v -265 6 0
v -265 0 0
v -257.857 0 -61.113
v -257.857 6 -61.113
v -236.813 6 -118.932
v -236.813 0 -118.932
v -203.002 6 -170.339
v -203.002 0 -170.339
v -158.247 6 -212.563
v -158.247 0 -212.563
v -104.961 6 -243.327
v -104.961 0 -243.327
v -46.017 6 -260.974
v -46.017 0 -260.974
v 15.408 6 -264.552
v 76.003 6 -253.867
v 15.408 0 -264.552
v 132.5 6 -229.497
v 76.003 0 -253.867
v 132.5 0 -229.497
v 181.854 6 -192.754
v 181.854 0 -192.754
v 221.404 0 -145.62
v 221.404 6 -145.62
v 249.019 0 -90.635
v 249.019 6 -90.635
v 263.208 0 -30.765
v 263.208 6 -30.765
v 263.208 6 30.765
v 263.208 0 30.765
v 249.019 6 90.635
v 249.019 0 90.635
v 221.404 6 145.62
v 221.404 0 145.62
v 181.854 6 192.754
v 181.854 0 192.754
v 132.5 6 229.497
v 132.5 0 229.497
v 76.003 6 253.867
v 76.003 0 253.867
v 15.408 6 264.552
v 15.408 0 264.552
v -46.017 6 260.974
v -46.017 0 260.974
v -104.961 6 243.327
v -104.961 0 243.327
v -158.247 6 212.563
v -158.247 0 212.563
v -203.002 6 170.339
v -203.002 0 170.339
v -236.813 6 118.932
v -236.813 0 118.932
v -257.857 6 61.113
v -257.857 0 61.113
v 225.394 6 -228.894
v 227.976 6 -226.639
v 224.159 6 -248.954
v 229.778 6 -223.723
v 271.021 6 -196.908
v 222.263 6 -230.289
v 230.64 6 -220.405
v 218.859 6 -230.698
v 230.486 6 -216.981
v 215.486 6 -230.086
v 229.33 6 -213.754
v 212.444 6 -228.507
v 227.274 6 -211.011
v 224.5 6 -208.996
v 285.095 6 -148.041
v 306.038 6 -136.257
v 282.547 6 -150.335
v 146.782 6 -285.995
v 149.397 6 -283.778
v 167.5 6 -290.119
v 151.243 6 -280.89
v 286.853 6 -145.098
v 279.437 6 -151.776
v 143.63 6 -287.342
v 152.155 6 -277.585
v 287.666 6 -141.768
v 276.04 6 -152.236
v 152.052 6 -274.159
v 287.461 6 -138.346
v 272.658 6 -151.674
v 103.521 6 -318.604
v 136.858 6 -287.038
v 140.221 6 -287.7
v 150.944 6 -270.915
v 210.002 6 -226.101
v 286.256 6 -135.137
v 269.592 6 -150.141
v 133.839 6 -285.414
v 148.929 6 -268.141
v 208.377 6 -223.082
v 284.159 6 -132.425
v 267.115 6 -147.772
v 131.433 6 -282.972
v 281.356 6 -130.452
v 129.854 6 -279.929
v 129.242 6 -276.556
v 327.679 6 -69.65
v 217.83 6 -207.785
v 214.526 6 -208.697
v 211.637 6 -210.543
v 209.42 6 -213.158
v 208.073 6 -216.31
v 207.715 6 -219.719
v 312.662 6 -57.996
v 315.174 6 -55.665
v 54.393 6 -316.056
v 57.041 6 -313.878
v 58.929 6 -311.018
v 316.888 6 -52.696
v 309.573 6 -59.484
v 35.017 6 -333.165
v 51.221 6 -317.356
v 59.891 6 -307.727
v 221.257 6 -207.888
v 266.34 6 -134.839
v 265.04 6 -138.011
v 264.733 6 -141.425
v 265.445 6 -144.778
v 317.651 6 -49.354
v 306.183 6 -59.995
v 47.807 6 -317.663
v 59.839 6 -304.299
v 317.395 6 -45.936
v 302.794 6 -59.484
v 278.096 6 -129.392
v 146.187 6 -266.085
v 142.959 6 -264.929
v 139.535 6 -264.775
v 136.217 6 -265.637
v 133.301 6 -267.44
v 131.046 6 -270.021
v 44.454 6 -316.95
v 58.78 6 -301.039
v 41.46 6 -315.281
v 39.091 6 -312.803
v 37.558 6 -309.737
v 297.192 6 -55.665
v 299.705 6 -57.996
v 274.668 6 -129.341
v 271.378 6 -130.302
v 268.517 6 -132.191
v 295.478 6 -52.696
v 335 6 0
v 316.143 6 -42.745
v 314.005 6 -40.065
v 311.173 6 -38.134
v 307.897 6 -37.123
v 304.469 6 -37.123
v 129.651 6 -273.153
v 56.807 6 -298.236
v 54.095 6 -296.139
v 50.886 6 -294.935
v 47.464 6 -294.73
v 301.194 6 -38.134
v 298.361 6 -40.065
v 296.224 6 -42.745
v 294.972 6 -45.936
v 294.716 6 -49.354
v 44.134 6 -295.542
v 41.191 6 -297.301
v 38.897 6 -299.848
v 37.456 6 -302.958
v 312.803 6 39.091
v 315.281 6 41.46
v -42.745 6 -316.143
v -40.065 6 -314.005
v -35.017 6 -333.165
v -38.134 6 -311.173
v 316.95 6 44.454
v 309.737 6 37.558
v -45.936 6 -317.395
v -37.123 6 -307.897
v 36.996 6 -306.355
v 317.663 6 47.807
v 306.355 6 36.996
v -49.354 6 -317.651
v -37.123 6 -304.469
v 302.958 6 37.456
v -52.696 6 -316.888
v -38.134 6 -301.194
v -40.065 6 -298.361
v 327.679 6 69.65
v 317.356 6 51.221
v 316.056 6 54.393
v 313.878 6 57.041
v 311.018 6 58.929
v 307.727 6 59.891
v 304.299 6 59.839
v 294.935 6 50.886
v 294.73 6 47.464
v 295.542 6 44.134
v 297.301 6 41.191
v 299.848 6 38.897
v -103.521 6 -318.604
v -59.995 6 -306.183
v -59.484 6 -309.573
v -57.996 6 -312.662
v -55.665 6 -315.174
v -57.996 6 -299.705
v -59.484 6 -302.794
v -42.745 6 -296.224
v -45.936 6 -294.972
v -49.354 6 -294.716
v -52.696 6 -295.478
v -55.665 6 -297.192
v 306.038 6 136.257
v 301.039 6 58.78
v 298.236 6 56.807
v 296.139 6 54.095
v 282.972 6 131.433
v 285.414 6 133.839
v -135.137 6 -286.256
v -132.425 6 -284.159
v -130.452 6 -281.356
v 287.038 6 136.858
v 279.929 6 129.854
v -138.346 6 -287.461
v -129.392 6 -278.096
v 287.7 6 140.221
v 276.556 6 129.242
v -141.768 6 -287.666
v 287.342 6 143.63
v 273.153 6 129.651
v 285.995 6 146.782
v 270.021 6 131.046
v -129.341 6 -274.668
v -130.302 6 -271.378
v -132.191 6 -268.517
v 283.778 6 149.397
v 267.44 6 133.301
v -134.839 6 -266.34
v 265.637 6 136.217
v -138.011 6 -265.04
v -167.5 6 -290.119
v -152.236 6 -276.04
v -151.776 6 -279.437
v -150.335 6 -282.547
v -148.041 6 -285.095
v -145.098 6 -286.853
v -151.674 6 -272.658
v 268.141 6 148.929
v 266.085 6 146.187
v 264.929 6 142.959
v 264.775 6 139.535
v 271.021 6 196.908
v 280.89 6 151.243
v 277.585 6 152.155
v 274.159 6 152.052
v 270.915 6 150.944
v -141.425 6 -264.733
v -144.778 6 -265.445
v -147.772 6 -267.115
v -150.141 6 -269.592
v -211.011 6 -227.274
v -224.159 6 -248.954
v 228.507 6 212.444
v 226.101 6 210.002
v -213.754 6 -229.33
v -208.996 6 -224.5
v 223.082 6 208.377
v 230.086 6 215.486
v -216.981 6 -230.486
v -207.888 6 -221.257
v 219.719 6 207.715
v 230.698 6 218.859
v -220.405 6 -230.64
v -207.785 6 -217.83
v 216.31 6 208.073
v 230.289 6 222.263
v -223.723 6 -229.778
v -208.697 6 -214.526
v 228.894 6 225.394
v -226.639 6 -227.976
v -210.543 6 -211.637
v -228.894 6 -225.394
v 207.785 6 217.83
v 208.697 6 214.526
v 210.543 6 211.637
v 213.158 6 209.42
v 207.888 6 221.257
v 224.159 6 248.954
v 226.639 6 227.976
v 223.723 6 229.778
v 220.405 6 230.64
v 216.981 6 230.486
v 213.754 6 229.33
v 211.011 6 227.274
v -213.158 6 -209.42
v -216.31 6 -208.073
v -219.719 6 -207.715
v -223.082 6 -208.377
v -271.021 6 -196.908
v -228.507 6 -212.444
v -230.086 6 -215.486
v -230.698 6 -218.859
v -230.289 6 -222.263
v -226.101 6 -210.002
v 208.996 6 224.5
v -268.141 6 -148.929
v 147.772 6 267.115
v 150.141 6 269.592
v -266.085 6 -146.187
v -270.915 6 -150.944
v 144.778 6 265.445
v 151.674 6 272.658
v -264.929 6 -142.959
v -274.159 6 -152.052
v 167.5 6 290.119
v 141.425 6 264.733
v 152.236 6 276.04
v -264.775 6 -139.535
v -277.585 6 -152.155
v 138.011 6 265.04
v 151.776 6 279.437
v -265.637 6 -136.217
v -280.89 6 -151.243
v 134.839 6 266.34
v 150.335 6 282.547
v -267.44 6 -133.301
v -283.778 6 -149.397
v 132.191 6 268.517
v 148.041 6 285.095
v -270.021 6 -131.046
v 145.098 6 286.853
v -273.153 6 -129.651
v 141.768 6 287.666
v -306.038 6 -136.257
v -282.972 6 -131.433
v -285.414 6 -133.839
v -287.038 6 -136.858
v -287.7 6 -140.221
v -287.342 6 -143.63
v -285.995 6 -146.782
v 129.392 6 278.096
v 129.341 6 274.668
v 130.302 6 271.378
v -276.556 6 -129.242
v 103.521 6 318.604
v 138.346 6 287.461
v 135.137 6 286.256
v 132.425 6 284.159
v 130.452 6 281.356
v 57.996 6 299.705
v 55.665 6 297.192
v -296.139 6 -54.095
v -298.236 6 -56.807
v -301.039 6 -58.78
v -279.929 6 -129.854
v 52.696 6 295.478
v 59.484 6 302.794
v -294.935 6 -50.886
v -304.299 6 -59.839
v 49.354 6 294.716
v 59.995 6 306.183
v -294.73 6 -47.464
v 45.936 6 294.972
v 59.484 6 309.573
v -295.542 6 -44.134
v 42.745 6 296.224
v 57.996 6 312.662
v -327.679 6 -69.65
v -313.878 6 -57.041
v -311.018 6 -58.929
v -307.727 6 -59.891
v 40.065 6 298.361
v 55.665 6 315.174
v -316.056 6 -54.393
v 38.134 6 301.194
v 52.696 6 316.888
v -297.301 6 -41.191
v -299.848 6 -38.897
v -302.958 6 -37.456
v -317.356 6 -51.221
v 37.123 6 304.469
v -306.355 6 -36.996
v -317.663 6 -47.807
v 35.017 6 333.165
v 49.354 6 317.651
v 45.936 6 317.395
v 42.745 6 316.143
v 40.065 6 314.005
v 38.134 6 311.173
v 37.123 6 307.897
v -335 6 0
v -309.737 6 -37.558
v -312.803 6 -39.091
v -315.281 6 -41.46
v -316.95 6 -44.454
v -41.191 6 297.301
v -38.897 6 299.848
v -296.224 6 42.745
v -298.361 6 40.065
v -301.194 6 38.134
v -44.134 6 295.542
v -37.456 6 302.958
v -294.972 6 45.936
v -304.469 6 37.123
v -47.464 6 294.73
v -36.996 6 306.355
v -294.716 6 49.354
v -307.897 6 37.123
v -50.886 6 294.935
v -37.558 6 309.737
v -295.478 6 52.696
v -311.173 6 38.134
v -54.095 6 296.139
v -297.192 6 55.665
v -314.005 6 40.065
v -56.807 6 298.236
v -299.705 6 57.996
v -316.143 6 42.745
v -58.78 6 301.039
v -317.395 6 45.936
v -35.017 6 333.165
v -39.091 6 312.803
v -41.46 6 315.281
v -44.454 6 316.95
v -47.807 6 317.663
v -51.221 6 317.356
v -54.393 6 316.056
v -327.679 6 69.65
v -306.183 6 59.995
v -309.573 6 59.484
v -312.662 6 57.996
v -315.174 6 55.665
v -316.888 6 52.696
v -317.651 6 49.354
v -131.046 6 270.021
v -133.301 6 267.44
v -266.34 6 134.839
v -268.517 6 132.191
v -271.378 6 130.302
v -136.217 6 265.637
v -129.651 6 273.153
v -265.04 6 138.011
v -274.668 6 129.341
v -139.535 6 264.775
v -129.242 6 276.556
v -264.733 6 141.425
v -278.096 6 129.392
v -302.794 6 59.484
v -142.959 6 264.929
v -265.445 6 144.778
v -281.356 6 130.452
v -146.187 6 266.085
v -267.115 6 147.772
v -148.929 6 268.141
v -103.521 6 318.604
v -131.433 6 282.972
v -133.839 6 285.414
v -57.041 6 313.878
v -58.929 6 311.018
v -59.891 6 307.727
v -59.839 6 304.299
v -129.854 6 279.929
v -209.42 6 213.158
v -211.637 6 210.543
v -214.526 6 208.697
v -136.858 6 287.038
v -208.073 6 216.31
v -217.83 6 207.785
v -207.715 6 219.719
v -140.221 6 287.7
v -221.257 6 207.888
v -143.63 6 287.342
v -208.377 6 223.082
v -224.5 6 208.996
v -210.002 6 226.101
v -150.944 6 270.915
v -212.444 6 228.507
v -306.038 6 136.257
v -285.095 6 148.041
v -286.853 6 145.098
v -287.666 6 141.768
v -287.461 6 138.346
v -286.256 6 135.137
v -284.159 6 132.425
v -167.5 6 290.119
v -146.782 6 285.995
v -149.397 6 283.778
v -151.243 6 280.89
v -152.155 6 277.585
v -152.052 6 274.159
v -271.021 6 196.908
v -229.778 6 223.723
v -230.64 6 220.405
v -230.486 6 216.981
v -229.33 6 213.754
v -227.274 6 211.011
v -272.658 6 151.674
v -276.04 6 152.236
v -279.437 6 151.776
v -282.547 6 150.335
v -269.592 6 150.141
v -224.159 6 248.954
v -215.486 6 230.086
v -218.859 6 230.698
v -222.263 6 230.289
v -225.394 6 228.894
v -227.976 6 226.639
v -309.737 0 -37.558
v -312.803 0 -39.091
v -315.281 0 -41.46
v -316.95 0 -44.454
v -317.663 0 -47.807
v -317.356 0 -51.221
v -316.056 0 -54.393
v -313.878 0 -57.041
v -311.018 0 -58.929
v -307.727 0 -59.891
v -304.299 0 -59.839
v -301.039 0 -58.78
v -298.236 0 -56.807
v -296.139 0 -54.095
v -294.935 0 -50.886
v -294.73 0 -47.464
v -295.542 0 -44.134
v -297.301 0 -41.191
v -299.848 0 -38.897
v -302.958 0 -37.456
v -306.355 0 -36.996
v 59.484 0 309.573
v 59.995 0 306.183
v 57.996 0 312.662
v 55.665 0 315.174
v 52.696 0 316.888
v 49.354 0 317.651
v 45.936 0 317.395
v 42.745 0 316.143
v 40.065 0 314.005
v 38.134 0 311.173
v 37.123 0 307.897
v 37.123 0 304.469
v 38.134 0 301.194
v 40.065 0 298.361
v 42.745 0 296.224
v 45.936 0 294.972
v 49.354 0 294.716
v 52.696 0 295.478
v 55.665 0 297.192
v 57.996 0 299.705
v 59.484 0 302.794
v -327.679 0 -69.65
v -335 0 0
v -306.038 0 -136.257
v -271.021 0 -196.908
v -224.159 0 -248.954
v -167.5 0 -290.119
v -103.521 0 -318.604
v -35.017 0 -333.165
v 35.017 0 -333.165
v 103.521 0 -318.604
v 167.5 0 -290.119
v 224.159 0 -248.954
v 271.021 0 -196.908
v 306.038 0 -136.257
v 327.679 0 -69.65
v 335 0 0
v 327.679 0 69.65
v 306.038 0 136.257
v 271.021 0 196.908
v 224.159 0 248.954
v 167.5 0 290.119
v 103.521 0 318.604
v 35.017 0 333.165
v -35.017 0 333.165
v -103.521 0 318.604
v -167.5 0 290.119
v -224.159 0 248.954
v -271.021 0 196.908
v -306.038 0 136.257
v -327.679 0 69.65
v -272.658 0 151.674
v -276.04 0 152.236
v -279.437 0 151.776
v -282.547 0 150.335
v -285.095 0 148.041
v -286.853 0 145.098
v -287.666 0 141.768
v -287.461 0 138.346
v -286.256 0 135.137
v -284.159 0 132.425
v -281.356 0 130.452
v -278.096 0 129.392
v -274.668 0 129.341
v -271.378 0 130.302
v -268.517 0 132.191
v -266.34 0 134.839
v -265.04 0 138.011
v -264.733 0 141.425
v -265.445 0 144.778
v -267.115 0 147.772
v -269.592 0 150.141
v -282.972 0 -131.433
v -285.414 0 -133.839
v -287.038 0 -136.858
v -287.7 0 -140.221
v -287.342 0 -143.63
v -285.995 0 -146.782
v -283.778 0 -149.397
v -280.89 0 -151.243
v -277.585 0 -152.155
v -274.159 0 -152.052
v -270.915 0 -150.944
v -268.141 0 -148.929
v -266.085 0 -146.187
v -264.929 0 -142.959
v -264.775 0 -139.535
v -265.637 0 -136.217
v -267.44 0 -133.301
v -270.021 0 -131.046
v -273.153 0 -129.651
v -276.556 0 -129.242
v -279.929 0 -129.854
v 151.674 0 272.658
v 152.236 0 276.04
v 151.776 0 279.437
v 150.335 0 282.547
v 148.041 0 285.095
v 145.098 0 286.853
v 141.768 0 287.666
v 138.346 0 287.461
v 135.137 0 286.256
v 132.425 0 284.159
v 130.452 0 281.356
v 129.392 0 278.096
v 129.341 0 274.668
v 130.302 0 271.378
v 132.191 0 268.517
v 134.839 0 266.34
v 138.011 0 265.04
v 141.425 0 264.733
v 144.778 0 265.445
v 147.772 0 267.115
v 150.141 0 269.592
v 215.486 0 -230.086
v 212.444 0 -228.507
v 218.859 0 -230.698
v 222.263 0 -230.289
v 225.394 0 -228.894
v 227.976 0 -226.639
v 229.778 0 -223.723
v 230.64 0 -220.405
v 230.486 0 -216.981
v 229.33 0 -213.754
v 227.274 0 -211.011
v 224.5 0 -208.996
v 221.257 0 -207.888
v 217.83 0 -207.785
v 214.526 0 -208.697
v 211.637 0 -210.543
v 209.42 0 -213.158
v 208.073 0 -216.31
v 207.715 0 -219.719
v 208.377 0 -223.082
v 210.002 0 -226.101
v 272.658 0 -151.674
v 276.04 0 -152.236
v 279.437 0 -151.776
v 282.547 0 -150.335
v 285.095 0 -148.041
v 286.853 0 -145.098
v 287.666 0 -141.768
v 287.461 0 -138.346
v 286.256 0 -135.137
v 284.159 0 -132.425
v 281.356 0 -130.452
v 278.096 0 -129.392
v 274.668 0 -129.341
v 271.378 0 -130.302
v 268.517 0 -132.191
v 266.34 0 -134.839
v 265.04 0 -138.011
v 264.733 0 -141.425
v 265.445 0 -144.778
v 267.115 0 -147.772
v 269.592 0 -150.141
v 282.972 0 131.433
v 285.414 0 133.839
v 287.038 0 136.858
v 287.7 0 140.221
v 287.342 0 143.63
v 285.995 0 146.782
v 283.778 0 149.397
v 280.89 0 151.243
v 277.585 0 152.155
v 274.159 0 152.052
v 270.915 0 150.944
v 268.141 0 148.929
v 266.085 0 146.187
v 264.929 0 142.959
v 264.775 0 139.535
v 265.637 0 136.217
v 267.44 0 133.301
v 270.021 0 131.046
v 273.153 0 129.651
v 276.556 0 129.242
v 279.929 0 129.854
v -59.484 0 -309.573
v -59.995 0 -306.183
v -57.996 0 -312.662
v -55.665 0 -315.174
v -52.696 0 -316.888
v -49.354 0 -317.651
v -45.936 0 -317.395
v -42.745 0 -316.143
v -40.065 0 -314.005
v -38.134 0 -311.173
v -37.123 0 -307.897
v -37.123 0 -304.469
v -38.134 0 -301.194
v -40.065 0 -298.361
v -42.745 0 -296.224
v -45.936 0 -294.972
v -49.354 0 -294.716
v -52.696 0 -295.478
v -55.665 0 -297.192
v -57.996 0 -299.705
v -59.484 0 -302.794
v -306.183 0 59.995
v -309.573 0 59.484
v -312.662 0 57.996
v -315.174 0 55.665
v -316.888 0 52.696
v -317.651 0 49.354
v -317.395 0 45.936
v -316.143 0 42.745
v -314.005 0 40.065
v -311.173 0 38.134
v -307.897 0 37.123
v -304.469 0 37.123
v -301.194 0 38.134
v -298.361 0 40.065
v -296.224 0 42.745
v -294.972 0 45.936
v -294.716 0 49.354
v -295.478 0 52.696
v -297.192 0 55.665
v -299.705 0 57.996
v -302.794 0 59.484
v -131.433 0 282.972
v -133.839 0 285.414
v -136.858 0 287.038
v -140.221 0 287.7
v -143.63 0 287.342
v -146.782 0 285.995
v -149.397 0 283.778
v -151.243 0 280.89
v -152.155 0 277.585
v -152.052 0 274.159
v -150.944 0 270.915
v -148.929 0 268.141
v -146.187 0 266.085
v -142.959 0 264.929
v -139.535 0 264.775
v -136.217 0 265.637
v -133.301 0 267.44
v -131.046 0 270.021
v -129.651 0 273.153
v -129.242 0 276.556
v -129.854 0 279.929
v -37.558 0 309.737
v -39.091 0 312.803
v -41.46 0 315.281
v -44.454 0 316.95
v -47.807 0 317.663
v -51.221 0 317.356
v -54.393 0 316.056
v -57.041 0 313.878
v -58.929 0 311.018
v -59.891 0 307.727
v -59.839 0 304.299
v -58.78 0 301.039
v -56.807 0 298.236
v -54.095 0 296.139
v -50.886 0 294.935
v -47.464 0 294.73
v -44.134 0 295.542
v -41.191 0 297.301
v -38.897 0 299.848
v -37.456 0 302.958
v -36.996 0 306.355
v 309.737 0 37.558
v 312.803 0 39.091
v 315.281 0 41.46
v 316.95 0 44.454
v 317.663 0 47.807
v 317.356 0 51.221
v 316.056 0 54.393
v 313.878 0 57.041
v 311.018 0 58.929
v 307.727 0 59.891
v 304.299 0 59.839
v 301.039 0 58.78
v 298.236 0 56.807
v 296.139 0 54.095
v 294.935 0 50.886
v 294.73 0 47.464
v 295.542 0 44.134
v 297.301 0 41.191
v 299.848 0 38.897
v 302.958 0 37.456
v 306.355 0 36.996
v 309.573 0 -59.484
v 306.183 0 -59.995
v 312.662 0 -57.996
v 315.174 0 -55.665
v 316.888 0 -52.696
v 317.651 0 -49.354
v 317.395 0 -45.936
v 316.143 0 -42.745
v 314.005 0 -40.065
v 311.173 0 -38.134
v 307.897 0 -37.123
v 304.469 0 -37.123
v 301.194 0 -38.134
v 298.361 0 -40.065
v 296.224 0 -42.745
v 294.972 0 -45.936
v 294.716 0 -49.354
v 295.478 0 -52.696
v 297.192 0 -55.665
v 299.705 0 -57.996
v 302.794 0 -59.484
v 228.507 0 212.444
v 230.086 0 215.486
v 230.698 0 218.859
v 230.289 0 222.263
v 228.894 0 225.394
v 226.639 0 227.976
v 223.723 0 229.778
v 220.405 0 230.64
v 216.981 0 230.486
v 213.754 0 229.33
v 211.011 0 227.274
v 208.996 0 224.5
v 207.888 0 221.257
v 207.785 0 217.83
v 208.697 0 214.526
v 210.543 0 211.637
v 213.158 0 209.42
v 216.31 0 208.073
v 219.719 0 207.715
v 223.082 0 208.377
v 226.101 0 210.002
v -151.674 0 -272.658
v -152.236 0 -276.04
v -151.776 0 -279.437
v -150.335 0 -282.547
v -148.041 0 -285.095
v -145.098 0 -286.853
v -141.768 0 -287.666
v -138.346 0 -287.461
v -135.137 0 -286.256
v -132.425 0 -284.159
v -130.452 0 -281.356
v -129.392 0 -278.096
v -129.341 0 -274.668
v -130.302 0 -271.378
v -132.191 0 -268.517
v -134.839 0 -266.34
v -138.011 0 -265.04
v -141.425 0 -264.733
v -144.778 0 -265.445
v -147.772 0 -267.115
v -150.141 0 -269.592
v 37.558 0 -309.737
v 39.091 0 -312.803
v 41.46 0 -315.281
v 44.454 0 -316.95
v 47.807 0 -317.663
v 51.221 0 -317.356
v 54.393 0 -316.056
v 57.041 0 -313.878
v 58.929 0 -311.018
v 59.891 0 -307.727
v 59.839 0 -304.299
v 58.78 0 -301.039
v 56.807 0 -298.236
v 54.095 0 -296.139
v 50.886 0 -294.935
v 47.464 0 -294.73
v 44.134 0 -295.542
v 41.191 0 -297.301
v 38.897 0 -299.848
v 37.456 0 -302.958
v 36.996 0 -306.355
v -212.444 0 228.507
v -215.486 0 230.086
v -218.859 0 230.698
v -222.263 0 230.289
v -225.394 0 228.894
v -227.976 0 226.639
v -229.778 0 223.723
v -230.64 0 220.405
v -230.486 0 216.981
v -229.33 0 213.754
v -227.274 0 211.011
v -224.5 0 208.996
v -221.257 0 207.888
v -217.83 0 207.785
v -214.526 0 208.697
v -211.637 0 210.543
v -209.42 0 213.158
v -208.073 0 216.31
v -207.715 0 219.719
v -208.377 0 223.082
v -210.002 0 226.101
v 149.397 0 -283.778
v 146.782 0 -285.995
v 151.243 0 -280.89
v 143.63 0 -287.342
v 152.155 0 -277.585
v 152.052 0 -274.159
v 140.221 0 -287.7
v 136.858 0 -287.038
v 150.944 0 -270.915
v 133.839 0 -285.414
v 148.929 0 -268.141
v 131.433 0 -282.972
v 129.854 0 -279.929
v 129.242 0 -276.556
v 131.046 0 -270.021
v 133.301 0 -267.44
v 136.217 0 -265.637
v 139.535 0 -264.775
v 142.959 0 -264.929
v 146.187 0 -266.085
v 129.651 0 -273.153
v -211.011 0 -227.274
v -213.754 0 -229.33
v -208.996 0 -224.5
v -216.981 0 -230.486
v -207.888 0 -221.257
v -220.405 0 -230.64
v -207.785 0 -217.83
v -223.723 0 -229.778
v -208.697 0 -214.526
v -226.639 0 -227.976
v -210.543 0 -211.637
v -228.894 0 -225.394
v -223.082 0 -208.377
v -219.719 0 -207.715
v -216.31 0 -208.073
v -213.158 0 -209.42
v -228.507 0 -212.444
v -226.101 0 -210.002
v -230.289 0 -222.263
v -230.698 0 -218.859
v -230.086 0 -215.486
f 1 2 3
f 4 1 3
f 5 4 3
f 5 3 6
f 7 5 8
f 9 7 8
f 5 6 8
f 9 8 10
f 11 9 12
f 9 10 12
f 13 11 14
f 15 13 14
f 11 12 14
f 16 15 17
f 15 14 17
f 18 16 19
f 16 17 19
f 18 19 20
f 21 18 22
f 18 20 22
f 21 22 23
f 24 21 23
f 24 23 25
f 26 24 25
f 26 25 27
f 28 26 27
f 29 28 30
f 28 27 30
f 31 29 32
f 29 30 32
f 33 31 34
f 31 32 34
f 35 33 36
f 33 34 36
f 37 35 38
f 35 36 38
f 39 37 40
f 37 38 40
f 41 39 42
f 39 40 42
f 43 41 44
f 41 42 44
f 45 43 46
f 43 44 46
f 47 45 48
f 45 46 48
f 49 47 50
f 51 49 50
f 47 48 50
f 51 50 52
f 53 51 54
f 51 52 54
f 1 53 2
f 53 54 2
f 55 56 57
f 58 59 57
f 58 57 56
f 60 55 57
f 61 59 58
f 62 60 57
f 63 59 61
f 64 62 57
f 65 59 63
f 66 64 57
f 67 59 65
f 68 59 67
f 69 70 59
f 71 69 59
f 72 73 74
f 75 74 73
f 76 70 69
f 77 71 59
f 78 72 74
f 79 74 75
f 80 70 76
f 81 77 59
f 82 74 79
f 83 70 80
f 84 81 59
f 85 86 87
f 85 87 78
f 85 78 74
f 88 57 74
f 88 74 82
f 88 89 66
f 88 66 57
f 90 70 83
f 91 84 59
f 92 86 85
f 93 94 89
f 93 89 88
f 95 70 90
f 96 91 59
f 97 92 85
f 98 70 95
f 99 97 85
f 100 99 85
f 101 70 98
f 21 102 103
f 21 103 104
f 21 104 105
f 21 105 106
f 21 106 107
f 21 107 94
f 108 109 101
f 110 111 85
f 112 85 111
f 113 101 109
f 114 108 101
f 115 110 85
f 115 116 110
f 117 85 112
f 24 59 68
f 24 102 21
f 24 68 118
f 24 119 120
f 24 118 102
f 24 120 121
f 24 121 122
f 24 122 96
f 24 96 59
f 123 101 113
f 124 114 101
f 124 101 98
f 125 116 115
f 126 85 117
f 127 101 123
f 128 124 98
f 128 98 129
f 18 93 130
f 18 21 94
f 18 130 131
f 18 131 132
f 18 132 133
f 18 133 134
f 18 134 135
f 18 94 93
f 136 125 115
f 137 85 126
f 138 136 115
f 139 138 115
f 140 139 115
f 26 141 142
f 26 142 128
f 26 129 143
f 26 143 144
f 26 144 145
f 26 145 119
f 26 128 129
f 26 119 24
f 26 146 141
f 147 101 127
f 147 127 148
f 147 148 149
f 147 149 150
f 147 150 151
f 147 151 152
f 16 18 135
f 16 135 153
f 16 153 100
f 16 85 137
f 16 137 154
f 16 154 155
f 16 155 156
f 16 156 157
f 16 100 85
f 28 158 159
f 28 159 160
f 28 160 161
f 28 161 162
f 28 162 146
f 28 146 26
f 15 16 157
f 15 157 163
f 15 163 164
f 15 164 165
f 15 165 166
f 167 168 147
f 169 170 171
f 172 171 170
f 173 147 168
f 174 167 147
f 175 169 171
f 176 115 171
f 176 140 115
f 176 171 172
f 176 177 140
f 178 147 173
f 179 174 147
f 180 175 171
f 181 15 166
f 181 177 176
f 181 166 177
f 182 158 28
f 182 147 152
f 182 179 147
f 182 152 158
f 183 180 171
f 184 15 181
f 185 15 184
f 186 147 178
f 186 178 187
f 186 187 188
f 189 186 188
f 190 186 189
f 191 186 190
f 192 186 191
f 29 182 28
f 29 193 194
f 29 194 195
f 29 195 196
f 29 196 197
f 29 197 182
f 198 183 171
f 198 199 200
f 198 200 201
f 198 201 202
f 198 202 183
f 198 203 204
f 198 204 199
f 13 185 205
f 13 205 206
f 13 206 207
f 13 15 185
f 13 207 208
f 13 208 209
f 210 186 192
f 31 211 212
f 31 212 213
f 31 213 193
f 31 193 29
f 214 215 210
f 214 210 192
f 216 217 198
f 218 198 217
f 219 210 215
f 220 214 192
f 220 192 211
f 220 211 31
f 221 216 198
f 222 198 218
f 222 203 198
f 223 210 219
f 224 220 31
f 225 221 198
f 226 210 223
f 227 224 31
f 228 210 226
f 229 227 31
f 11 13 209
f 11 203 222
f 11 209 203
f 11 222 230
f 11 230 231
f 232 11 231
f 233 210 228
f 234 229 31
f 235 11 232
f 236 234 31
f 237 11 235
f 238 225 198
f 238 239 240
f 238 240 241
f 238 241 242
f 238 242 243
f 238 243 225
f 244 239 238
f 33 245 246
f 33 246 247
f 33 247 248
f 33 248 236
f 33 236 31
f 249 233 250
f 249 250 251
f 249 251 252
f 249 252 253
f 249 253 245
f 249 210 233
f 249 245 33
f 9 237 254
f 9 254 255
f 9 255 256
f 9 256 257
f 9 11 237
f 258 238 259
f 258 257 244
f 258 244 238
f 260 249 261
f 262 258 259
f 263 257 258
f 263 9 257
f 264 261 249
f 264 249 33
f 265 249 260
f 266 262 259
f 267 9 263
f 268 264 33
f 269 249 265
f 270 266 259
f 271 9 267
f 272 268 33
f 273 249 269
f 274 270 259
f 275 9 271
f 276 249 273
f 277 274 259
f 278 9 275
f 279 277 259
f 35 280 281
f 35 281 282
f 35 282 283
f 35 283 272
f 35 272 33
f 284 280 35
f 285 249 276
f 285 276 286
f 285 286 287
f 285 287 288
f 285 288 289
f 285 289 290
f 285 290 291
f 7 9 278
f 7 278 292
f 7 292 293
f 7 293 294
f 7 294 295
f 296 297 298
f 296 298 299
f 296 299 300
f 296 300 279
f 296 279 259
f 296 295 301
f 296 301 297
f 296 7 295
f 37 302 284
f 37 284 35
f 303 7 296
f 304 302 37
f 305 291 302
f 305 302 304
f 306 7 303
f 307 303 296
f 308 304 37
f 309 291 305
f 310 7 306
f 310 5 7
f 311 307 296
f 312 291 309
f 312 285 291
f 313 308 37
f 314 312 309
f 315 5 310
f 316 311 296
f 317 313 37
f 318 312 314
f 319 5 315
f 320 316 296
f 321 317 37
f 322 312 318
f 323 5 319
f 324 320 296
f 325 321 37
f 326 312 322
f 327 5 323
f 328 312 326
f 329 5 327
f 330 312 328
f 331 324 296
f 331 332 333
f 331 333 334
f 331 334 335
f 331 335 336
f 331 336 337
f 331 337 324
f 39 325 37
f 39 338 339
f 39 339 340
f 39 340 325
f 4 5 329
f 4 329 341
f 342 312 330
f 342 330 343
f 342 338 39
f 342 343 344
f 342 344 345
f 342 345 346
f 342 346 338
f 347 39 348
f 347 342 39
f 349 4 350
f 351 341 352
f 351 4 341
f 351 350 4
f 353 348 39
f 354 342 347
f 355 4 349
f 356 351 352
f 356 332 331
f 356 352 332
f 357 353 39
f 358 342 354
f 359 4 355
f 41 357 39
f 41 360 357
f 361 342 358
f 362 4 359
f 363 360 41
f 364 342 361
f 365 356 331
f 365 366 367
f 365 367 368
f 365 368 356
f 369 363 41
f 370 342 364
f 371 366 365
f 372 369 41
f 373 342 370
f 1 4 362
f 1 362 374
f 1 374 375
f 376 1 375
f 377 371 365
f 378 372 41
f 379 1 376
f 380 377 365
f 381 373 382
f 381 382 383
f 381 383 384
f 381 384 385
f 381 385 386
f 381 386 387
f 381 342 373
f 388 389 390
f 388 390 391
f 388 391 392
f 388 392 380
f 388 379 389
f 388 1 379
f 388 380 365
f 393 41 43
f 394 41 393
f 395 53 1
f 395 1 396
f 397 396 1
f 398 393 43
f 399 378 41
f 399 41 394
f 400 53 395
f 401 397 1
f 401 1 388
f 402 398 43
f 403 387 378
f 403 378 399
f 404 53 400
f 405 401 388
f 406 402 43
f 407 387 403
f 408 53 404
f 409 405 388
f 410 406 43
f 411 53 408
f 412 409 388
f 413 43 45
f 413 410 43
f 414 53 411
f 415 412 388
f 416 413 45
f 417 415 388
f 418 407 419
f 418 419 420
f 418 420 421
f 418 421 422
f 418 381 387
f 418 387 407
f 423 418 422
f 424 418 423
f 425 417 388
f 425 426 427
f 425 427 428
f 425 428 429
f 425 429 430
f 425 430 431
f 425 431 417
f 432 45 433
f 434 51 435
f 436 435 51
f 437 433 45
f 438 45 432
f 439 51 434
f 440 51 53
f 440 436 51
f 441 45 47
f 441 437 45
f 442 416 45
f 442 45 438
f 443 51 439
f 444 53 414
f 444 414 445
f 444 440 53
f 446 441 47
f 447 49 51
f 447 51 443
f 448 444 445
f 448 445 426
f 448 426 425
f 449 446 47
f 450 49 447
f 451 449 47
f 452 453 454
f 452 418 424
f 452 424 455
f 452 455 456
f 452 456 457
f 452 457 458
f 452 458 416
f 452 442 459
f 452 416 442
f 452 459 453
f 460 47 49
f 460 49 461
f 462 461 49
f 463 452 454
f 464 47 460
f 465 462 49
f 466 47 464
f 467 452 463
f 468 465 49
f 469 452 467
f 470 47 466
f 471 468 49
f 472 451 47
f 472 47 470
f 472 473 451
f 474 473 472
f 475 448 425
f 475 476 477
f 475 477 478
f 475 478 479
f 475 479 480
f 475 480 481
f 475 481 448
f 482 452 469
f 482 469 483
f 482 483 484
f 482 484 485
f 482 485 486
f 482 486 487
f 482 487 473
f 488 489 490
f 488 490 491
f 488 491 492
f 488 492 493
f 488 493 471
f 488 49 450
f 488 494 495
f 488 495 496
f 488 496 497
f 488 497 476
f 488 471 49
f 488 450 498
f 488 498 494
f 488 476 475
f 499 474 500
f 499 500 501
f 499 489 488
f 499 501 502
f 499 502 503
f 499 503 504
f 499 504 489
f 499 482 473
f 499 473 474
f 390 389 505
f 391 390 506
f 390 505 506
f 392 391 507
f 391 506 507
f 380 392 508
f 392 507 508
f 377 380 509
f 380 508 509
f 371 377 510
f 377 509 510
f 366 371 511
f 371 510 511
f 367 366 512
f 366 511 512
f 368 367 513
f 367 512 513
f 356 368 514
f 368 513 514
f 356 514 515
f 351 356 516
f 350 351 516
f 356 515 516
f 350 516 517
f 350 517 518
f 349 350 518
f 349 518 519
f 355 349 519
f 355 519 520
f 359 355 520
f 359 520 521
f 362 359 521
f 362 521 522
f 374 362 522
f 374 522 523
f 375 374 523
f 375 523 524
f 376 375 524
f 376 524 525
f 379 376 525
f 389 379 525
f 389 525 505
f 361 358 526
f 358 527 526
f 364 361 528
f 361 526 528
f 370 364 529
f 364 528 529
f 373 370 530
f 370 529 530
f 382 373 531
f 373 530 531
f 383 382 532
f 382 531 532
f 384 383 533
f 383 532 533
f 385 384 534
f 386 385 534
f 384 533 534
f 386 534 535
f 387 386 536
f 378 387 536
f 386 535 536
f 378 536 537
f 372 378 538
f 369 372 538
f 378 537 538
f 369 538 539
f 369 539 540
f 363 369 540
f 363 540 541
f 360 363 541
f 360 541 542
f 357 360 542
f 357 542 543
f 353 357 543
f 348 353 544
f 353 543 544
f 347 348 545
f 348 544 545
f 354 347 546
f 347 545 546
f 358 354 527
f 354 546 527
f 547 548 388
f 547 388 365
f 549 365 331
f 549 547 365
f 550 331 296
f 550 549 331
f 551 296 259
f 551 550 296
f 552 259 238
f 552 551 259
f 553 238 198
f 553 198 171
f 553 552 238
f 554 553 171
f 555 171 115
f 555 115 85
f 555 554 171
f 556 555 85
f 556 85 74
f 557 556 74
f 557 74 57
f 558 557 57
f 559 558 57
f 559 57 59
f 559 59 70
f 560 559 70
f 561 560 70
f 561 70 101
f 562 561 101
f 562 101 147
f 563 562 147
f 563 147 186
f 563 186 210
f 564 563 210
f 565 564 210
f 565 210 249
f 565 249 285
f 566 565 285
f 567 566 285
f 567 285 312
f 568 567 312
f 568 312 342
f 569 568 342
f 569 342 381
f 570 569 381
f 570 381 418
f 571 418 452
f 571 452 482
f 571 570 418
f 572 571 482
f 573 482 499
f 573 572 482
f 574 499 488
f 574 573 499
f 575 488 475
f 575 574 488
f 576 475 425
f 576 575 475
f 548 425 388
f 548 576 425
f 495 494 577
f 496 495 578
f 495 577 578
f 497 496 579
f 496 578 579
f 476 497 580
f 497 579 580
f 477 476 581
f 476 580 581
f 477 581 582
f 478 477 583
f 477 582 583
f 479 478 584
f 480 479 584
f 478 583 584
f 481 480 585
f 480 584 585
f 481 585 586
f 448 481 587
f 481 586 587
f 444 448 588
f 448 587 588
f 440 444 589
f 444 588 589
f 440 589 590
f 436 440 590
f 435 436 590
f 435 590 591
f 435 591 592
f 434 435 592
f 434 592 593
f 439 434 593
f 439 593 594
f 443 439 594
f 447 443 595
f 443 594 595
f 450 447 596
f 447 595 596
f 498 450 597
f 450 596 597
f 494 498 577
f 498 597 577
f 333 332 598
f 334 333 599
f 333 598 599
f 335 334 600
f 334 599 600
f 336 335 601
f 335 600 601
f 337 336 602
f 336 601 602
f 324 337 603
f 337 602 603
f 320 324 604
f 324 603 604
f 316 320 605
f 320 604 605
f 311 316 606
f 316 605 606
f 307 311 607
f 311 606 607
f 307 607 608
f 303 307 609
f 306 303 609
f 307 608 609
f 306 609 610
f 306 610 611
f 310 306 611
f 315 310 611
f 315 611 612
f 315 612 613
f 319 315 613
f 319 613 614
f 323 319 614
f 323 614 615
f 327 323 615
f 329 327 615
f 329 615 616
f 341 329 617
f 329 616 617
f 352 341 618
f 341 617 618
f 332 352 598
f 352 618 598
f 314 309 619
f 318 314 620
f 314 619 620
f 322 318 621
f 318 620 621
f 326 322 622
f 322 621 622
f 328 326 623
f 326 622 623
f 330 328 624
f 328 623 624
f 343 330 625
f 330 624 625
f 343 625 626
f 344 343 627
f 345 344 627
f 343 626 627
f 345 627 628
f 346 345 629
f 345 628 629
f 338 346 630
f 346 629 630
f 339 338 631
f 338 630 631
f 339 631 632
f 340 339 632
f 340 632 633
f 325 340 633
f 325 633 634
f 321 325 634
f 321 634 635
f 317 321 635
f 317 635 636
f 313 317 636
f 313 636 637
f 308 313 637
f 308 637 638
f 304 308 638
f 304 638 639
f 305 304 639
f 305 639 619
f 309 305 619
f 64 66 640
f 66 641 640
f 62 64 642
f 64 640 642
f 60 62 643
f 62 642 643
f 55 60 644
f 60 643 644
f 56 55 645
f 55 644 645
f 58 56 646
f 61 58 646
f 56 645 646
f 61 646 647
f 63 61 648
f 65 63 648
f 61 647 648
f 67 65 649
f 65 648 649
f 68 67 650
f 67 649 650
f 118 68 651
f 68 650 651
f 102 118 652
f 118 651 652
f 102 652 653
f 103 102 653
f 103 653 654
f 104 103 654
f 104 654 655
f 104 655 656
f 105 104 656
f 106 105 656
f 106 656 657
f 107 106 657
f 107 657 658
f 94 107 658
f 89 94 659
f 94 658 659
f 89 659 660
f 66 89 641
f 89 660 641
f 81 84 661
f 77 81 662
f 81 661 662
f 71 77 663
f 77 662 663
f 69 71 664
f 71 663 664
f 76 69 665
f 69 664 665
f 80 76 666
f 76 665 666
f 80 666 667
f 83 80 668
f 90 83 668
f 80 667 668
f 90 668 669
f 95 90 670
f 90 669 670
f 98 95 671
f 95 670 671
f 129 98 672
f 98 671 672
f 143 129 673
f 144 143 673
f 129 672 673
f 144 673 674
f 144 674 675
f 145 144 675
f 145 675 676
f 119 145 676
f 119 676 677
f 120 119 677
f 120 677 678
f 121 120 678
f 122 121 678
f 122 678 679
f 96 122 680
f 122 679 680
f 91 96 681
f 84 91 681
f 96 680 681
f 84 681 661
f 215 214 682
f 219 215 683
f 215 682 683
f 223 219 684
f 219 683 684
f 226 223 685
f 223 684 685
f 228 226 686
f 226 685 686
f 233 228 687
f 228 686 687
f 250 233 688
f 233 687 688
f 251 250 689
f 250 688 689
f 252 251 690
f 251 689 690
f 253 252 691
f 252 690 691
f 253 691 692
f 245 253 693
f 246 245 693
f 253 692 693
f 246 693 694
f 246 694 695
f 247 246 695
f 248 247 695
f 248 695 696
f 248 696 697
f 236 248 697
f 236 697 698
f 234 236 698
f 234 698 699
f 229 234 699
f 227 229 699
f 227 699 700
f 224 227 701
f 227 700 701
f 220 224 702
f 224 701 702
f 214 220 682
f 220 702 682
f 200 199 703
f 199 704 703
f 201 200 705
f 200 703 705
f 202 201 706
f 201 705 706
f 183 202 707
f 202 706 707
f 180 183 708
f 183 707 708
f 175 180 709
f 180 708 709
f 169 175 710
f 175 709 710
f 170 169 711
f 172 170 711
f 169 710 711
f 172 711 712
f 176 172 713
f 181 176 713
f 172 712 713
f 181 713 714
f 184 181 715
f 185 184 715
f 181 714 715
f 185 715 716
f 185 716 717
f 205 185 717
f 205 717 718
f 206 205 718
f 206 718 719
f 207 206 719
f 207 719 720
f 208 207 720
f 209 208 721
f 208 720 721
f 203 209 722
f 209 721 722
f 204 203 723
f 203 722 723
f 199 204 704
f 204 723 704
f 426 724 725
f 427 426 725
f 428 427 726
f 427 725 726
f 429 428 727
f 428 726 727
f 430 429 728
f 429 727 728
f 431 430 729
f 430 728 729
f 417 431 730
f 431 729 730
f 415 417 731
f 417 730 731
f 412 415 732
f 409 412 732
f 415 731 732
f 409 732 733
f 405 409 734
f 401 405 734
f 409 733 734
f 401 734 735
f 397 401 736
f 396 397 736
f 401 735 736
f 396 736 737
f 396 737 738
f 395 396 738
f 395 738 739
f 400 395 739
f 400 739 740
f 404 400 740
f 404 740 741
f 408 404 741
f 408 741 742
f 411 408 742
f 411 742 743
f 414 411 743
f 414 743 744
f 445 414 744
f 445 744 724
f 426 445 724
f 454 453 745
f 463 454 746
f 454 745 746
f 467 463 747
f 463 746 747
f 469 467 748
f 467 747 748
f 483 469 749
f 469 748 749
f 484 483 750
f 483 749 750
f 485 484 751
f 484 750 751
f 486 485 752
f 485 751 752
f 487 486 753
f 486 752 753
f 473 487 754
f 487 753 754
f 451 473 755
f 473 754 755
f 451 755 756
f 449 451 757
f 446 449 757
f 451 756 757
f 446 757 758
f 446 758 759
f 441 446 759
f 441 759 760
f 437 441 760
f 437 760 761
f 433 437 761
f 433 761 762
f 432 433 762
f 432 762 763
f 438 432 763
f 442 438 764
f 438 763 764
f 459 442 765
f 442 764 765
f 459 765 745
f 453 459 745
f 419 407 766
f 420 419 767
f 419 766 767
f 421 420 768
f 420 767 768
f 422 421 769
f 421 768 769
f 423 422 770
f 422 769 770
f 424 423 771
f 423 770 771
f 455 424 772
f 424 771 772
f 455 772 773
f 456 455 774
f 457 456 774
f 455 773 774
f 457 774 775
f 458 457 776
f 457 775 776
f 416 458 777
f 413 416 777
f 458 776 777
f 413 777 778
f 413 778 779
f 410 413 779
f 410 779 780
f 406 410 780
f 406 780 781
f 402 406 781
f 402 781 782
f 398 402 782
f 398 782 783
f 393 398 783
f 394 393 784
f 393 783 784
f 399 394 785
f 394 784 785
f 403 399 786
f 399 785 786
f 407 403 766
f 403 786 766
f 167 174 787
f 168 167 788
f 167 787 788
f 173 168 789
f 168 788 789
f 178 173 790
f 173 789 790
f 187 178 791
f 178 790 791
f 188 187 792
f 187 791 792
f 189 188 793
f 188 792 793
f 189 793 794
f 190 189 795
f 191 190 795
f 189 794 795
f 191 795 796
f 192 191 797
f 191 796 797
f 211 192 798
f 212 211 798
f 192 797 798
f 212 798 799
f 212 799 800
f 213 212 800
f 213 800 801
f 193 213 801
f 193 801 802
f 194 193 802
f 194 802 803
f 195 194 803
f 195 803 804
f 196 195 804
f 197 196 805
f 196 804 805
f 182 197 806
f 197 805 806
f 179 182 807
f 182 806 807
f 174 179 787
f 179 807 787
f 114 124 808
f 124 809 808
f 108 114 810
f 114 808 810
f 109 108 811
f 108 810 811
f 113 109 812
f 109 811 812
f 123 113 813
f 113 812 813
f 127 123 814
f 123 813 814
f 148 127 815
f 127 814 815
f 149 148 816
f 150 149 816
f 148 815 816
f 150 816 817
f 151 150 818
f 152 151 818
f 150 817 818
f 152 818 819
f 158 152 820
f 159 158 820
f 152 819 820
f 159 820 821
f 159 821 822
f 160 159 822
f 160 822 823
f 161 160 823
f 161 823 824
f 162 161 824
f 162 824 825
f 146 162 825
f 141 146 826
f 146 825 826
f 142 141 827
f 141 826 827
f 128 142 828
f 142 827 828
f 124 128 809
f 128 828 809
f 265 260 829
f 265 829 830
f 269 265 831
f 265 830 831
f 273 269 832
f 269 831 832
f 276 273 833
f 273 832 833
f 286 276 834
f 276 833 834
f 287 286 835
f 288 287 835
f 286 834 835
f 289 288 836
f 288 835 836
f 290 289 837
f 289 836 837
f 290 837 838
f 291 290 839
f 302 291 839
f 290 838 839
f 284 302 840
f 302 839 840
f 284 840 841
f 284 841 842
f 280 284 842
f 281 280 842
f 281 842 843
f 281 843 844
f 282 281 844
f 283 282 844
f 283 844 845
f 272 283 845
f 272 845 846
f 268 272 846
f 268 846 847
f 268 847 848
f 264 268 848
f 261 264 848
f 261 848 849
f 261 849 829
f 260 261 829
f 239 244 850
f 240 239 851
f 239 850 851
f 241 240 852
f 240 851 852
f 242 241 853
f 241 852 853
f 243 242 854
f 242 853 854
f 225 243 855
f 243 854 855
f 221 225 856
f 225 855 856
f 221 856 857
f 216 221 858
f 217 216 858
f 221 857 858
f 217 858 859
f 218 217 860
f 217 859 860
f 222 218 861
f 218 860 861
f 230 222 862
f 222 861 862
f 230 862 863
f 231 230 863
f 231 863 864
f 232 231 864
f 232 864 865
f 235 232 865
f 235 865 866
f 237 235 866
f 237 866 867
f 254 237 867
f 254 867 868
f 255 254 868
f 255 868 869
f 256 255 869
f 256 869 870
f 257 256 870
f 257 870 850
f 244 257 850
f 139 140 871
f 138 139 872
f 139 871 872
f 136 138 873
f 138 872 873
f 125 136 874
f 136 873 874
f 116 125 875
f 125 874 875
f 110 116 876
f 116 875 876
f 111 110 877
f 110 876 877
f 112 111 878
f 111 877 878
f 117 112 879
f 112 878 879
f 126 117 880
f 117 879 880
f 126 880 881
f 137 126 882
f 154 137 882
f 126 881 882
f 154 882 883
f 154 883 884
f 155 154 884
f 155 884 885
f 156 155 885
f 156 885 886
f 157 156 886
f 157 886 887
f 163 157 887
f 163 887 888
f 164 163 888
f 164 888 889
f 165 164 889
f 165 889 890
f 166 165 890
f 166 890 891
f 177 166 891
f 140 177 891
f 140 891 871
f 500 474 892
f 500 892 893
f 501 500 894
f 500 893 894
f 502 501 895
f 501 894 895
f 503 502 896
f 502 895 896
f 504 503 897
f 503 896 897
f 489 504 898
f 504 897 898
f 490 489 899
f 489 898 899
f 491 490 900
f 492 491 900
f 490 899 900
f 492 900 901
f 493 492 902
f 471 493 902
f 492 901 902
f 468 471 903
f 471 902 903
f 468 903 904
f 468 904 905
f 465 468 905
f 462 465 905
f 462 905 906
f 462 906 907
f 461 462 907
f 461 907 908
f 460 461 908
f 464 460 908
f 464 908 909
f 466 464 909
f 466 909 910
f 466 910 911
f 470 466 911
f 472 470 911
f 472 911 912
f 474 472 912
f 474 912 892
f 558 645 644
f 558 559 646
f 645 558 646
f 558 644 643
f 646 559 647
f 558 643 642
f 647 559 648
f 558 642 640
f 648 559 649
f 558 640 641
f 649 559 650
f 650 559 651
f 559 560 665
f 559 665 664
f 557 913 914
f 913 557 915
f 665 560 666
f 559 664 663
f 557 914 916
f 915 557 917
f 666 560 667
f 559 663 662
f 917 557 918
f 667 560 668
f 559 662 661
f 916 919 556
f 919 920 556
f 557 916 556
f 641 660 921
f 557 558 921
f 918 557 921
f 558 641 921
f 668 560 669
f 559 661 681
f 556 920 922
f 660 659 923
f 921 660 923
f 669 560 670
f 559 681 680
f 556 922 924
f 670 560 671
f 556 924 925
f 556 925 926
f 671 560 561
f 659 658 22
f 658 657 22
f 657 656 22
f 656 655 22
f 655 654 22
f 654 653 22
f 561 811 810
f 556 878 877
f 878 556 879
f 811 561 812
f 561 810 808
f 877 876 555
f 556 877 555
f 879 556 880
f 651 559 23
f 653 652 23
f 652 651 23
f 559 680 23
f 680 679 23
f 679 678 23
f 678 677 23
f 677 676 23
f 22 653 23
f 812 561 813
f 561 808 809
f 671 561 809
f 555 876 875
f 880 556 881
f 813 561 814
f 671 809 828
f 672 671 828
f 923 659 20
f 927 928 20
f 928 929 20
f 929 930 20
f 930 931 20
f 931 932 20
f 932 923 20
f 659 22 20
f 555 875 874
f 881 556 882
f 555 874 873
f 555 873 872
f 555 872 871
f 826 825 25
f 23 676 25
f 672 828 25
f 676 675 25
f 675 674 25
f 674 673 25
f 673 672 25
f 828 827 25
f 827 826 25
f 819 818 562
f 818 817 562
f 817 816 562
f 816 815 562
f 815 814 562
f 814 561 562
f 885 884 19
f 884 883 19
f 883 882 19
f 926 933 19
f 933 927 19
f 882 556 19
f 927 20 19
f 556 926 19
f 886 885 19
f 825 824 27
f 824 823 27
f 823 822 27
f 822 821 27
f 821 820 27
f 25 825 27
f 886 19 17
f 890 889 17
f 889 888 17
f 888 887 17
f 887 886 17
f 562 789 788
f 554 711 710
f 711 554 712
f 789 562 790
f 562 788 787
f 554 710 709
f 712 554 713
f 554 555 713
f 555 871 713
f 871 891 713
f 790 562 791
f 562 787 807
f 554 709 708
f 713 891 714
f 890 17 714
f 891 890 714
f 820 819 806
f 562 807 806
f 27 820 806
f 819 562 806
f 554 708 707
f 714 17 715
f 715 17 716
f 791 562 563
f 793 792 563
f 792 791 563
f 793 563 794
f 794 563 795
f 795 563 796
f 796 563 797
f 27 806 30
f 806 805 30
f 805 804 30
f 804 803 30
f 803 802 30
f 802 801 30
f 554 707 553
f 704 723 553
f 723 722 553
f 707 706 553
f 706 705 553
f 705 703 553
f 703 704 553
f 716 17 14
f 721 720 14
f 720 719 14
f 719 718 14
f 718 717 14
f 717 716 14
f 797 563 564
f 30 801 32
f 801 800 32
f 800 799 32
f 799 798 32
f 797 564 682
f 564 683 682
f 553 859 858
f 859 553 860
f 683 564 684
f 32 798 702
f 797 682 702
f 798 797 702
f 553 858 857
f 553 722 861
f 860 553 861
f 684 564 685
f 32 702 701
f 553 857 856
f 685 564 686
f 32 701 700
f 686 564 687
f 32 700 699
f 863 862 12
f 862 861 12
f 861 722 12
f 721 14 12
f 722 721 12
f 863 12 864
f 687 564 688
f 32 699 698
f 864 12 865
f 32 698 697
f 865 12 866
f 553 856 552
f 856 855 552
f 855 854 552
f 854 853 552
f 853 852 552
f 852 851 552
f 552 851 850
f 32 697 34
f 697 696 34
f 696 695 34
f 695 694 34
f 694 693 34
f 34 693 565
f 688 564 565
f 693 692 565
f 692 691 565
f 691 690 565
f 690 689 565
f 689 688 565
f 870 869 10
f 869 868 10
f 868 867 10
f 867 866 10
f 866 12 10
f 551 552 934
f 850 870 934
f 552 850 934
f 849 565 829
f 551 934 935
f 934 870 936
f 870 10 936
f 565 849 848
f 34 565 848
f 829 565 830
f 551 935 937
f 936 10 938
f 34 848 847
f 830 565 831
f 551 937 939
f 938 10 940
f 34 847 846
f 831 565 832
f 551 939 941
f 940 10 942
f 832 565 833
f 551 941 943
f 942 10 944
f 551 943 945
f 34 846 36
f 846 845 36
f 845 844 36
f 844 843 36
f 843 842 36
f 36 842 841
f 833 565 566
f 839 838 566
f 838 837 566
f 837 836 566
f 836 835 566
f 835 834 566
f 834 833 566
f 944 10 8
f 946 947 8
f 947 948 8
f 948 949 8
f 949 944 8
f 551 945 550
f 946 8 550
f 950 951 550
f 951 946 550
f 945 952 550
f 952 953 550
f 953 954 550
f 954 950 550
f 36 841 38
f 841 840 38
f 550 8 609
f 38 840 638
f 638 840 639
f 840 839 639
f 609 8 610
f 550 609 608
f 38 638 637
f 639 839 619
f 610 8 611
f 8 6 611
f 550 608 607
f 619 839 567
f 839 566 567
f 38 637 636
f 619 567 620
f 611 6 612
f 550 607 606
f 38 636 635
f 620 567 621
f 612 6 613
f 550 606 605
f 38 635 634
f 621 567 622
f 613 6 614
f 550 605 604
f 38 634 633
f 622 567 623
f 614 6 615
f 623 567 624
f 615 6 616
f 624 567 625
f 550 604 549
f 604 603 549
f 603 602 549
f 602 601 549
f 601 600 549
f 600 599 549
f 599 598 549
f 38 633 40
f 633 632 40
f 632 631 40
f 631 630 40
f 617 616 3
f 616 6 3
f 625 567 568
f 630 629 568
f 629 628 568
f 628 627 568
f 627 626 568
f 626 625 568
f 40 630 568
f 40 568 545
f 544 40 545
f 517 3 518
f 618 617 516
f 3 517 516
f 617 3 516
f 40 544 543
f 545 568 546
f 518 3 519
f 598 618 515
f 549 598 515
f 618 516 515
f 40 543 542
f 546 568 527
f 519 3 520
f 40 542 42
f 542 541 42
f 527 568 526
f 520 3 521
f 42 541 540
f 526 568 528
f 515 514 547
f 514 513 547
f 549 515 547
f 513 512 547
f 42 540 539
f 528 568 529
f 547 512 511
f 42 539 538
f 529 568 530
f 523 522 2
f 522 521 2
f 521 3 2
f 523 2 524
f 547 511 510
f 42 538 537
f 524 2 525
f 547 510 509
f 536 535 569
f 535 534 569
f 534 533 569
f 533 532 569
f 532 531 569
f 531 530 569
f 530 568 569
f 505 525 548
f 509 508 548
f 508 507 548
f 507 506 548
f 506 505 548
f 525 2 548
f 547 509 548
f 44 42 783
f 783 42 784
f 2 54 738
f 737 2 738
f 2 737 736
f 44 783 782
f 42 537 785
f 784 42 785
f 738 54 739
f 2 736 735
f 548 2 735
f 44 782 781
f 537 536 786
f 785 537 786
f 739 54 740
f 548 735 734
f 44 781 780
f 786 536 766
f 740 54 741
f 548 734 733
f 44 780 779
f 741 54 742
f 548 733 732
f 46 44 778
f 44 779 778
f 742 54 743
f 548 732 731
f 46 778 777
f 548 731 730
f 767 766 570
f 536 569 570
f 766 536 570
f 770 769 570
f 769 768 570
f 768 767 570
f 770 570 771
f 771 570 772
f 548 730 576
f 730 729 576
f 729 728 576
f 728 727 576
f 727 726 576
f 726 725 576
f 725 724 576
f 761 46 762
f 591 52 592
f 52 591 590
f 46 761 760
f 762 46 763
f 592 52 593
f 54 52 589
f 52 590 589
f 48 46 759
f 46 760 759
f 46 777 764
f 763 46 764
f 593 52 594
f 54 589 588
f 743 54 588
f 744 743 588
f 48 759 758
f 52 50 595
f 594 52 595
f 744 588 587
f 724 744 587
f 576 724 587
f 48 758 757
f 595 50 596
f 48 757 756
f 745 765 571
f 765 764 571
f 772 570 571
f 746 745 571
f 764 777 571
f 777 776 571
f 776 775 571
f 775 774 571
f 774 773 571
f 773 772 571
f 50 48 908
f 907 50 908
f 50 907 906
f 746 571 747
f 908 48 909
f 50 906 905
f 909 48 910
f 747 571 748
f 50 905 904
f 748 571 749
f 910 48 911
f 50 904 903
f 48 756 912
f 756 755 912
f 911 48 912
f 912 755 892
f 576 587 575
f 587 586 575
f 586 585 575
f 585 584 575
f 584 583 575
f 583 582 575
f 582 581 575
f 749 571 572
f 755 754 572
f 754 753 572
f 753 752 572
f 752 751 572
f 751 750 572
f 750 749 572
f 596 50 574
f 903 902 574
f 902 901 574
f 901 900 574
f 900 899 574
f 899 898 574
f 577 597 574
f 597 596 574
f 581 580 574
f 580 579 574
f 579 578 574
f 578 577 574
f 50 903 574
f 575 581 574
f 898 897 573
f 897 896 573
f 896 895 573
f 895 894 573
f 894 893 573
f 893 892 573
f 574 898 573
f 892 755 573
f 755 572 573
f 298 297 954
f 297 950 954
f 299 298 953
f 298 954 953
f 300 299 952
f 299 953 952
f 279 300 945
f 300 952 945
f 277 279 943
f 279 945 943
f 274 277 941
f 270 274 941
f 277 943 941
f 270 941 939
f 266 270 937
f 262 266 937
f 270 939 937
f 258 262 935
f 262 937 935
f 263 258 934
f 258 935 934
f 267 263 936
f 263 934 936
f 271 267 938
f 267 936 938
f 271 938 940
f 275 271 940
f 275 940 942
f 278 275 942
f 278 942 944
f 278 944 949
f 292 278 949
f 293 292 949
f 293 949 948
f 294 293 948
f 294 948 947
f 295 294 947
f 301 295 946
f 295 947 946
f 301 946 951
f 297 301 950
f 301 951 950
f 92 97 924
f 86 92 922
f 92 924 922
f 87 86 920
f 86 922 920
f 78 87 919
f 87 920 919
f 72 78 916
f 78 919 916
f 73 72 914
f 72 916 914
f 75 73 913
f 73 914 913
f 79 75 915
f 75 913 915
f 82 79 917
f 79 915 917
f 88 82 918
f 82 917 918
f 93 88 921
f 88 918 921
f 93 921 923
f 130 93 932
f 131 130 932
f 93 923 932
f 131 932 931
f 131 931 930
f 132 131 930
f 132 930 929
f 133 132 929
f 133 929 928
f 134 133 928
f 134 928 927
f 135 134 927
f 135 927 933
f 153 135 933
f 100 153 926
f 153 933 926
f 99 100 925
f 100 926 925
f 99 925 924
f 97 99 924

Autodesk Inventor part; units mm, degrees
ref_plane "YZ Plane" through (0, 0, 0) normal (1, 0, 0) x (0, 1, 0)
ref_plane "XZ Plane" through (0, 0, 0) normal (0, 1, 0) x (-1, 0, 0)
ref_plane "XY Plane" through (0, 0, 0) normal (0, 0, 1) x (1, 0, 0)
sketch "Sketch1" plane through (0, 0, 0) normal (0, 1, 0) x (-1, 0, 0)
  circle A0 centre (0, 0) radius 265
  circle A1 centre (0, 0) radius 335
  line L0 (335, 0) -> (265, 0)
  line L1 (-265, 0) -> (-335, 0)
  line L2 (0, 265) -> (0, 335)
  point P0 (300, 0)
  point P1 (-300, 0)
  point P2 (0, 300)
  dimension "d1" = 670
  dimension "d4" = 530
extrude "Extrusion1" add sketch "Sketch1" along normal blind 6 contours L0 A1 L1 A0 | A0 L2 A1 L0 | A0 L1 A1 L2
sketch "Sketch2" plane through (0, 0, 0) normal (0, -1, 0) x (1, 0, 0)
  circle A0 centre (0, 0) radius 335 projected
  circle A1 centre (0, 0) radius 265 projected
  circle A2 centre (48.4947, 306.1834) radius 11.5
  circle A3 centre (0, 0) radius 265 projected
  line L0 (48.4947, 306.1834) -> (0, 0)
  point P0 (0, 265)
  point P1 (265, 0)
  dimension "d5" = 310
  dimension "d7" = 23
extrude "Cut1" cut sketch "Sketch2" against normal blind 12 contours A2
pattern_circular "Circular Pattern1" count 20 over 360 about axis through (0, 0, 0) along (0, 1, 0) of "Cut1"
equation "\"d9\" = Thickness"
equation "\"BendRadius\" = Thickness"
equation "\"BendReliefWidth\" = Thickness"
equation "\"BendReliefDepth\" = 0.5 * Thickness"
equation "\"CornerReliefSize\" = 4 * Thickness"
equation "\"MinimumRemnant\" = 2 * Thickness"
equation "\"TransitionRadius\" = BendRadius"
equation "\"JacobiRadiusSize\" = BendRadius"
equation "\"GapSize\" = Thickness"
equation "\"d8\" = Thickness"
equation "\"Thickness\" = 12"
properties part number "ANP 1403 accses hatch flange" material "Steel"
